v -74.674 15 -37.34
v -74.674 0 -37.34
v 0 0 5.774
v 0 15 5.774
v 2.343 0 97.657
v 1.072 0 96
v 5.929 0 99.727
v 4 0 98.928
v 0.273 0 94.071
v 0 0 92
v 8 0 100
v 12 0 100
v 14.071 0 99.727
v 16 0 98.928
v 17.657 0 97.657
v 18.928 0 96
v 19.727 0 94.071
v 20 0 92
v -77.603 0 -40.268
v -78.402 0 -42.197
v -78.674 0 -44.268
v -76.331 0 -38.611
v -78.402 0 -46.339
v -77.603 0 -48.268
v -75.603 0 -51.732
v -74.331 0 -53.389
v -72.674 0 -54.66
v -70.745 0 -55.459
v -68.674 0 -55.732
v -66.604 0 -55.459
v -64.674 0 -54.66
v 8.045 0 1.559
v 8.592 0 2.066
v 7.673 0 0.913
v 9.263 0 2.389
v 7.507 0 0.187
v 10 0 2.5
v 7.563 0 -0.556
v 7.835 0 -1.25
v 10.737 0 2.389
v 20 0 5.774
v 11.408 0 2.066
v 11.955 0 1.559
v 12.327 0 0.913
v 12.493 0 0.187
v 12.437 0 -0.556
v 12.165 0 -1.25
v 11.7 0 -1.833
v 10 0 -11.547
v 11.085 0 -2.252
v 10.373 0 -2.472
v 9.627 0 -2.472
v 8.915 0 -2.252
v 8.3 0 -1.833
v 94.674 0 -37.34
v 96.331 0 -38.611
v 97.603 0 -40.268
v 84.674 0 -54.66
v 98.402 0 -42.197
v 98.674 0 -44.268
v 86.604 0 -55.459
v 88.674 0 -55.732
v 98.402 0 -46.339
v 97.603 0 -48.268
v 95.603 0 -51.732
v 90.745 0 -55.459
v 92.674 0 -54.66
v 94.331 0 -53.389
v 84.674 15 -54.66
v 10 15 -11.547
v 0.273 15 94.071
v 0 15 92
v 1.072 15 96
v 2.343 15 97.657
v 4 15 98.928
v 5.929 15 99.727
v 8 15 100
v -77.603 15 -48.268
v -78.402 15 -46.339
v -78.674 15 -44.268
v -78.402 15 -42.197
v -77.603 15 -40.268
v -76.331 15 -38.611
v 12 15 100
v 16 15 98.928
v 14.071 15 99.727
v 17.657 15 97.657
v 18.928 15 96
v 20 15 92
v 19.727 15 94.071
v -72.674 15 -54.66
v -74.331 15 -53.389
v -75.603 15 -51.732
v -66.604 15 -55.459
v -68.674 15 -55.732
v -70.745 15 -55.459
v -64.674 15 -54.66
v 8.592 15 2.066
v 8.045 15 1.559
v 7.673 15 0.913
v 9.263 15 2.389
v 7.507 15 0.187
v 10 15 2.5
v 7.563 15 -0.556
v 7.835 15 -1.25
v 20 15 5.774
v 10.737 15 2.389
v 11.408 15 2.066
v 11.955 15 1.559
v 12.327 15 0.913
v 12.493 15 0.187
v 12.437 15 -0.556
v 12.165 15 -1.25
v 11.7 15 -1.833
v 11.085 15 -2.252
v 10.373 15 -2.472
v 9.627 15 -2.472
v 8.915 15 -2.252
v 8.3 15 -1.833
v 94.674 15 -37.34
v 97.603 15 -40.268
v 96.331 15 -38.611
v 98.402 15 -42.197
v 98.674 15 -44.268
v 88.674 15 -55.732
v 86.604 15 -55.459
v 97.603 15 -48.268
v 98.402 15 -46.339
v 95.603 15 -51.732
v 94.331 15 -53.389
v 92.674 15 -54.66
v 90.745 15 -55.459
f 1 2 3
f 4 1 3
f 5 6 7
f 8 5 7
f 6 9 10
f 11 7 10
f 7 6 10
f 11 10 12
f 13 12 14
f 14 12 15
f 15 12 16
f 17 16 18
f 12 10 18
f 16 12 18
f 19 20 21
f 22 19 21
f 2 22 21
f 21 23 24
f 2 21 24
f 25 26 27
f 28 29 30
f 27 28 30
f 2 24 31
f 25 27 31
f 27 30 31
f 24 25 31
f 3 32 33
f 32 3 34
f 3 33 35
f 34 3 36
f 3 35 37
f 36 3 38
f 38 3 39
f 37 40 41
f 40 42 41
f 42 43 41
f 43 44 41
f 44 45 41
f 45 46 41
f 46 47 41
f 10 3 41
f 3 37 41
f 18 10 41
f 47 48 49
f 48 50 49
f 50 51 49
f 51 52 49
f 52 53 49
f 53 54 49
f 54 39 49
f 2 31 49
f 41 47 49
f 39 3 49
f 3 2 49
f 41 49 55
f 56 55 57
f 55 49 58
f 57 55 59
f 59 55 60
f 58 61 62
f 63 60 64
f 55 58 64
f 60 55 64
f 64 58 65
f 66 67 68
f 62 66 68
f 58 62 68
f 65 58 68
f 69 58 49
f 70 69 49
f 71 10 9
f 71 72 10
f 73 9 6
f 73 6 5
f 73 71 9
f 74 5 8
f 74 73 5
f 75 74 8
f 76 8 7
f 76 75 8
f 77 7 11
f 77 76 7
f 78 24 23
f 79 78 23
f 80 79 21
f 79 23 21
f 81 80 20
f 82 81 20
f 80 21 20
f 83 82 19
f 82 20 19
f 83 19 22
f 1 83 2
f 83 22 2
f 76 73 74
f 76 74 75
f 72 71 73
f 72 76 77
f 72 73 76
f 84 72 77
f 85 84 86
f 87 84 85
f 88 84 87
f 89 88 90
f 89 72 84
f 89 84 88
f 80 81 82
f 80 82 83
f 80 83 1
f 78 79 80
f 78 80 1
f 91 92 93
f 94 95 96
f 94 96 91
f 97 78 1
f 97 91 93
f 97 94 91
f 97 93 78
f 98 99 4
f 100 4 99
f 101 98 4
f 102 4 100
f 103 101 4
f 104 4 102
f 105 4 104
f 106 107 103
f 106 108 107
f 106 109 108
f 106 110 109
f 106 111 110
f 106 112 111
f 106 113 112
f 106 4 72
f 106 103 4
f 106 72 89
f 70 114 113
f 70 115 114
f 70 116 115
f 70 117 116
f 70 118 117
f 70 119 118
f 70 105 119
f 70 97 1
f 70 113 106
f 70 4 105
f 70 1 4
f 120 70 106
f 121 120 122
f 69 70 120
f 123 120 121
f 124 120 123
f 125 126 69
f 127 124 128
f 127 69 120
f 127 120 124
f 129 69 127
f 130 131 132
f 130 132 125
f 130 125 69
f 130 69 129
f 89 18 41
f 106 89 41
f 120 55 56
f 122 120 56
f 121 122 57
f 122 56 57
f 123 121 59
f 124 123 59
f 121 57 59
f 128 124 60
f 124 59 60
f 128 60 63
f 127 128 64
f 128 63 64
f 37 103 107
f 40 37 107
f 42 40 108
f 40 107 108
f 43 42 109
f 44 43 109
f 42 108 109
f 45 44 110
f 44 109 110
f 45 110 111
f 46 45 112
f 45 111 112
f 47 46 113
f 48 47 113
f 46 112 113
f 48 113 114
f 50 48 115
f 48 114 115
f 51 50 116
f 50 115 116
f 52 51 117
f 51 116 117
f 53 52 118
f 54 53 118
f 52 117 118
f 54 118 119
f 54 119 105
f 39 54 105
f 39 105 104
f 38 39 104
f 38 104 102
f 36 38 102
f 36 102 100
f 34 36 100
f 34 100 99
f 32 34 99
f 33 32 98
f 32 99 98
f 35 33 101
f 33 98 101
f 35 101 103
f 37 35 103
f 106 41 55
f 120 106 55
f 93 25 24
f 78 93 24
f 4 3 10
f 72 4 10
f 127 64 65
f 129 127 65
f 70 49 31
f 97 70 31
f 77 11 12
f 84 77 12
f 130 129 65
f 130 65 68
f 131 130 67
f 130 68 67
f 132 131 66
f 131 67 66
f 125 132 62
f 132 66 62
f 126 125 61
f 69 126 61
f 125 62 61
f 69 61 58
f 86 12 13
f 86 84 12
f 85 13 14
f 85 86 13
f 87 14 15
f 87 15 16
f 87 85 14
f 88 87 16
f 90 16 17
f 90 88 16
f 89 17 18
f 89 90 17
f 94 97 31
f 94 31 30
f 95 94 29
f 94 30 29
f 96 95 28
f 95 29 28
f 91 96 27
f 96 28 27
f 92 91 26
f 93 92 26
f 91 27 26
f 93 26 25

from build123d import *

# Parameters (mm, degrees)
BOSS_EXTRU_1_DEPTH      = 15
CONG_1_R                = 8
ESQUISSE2_R             = 2.5
ENL_V_MAT_EXTRU_1_DEPTH = 15


with BuildPart() as part:
    # Esquisse1 → Boss.-Extru.1 (new body)
    with BuildSketch(Plane(origin=(0, 0, 0), x_dir=(1, 0, 0), z_dir=(0, 1, 0))):
        with BuildLine():
            Line((84.674337148, 54.660254038), (10, 11.547005384))
            Line((10, 11.547005384), (-64.674337148, 54.660254038))
            ThreePointArc((-64.674337148, 54.660254038), (-70.744889509, 55.459457418), (-75.602540378, 51.732050808))
            Line((-75.602540378, 51.732050808), (-77.602540378, 48.267949192))
            ThreePointArc((-77.602540378, 48.267949192), (-78.401743758, 42.197396832), (-74.674337148, 37.339745962))
            Line((-74.674337148, 37.339745962), (0, -5.773502692))
            Line((0, -5.773502692), (0, -100))
            Line((0, -100), (20, -100))
            Line((20, -100), (20, -5.773502692))
            Line((20, -5.773502692), (94.674337148, 37.339745962))
            ThreePointArc((94.674337148, 37.339745962), (98.401743758, 42.197396832), (97.602540378, 48.267949192))
            Line((97.602540378, 48.267949192), (95.602540378, 51.732050808))
            ThreePointArc((95.602540378, 51.732050808), (90.744889509, 55.459457418), (84.674337148, 54.660254038))
        make_face()
    extrude(amount=BOSS_EXTRU_1_DEPTH)

    # Congé1
    cong_1_edges = [part.edges().sort_by_distance(p)[0] for p in [
        (0, 7.5, 100),
        (20, 7.5, 100),
    ]]
    fillet(cong_1_edges, radius=CONG_1_R)

    # Esquisse2 → Enlèv. mat.-Extru.1 (cut)
    with BuildSketch(Plane(origin=(0, 15, 0), x_dir=(1, 0, 0), z_dir=(0, 1, 0))):
        with Locations((10, 0)):
            Circle(ESQUISSE2_R)
    extrude(amount=-ENL_V_MAT_EXTRU_1_DEPTH, mode=Mode.SUBTRACT)


solid = part.part
